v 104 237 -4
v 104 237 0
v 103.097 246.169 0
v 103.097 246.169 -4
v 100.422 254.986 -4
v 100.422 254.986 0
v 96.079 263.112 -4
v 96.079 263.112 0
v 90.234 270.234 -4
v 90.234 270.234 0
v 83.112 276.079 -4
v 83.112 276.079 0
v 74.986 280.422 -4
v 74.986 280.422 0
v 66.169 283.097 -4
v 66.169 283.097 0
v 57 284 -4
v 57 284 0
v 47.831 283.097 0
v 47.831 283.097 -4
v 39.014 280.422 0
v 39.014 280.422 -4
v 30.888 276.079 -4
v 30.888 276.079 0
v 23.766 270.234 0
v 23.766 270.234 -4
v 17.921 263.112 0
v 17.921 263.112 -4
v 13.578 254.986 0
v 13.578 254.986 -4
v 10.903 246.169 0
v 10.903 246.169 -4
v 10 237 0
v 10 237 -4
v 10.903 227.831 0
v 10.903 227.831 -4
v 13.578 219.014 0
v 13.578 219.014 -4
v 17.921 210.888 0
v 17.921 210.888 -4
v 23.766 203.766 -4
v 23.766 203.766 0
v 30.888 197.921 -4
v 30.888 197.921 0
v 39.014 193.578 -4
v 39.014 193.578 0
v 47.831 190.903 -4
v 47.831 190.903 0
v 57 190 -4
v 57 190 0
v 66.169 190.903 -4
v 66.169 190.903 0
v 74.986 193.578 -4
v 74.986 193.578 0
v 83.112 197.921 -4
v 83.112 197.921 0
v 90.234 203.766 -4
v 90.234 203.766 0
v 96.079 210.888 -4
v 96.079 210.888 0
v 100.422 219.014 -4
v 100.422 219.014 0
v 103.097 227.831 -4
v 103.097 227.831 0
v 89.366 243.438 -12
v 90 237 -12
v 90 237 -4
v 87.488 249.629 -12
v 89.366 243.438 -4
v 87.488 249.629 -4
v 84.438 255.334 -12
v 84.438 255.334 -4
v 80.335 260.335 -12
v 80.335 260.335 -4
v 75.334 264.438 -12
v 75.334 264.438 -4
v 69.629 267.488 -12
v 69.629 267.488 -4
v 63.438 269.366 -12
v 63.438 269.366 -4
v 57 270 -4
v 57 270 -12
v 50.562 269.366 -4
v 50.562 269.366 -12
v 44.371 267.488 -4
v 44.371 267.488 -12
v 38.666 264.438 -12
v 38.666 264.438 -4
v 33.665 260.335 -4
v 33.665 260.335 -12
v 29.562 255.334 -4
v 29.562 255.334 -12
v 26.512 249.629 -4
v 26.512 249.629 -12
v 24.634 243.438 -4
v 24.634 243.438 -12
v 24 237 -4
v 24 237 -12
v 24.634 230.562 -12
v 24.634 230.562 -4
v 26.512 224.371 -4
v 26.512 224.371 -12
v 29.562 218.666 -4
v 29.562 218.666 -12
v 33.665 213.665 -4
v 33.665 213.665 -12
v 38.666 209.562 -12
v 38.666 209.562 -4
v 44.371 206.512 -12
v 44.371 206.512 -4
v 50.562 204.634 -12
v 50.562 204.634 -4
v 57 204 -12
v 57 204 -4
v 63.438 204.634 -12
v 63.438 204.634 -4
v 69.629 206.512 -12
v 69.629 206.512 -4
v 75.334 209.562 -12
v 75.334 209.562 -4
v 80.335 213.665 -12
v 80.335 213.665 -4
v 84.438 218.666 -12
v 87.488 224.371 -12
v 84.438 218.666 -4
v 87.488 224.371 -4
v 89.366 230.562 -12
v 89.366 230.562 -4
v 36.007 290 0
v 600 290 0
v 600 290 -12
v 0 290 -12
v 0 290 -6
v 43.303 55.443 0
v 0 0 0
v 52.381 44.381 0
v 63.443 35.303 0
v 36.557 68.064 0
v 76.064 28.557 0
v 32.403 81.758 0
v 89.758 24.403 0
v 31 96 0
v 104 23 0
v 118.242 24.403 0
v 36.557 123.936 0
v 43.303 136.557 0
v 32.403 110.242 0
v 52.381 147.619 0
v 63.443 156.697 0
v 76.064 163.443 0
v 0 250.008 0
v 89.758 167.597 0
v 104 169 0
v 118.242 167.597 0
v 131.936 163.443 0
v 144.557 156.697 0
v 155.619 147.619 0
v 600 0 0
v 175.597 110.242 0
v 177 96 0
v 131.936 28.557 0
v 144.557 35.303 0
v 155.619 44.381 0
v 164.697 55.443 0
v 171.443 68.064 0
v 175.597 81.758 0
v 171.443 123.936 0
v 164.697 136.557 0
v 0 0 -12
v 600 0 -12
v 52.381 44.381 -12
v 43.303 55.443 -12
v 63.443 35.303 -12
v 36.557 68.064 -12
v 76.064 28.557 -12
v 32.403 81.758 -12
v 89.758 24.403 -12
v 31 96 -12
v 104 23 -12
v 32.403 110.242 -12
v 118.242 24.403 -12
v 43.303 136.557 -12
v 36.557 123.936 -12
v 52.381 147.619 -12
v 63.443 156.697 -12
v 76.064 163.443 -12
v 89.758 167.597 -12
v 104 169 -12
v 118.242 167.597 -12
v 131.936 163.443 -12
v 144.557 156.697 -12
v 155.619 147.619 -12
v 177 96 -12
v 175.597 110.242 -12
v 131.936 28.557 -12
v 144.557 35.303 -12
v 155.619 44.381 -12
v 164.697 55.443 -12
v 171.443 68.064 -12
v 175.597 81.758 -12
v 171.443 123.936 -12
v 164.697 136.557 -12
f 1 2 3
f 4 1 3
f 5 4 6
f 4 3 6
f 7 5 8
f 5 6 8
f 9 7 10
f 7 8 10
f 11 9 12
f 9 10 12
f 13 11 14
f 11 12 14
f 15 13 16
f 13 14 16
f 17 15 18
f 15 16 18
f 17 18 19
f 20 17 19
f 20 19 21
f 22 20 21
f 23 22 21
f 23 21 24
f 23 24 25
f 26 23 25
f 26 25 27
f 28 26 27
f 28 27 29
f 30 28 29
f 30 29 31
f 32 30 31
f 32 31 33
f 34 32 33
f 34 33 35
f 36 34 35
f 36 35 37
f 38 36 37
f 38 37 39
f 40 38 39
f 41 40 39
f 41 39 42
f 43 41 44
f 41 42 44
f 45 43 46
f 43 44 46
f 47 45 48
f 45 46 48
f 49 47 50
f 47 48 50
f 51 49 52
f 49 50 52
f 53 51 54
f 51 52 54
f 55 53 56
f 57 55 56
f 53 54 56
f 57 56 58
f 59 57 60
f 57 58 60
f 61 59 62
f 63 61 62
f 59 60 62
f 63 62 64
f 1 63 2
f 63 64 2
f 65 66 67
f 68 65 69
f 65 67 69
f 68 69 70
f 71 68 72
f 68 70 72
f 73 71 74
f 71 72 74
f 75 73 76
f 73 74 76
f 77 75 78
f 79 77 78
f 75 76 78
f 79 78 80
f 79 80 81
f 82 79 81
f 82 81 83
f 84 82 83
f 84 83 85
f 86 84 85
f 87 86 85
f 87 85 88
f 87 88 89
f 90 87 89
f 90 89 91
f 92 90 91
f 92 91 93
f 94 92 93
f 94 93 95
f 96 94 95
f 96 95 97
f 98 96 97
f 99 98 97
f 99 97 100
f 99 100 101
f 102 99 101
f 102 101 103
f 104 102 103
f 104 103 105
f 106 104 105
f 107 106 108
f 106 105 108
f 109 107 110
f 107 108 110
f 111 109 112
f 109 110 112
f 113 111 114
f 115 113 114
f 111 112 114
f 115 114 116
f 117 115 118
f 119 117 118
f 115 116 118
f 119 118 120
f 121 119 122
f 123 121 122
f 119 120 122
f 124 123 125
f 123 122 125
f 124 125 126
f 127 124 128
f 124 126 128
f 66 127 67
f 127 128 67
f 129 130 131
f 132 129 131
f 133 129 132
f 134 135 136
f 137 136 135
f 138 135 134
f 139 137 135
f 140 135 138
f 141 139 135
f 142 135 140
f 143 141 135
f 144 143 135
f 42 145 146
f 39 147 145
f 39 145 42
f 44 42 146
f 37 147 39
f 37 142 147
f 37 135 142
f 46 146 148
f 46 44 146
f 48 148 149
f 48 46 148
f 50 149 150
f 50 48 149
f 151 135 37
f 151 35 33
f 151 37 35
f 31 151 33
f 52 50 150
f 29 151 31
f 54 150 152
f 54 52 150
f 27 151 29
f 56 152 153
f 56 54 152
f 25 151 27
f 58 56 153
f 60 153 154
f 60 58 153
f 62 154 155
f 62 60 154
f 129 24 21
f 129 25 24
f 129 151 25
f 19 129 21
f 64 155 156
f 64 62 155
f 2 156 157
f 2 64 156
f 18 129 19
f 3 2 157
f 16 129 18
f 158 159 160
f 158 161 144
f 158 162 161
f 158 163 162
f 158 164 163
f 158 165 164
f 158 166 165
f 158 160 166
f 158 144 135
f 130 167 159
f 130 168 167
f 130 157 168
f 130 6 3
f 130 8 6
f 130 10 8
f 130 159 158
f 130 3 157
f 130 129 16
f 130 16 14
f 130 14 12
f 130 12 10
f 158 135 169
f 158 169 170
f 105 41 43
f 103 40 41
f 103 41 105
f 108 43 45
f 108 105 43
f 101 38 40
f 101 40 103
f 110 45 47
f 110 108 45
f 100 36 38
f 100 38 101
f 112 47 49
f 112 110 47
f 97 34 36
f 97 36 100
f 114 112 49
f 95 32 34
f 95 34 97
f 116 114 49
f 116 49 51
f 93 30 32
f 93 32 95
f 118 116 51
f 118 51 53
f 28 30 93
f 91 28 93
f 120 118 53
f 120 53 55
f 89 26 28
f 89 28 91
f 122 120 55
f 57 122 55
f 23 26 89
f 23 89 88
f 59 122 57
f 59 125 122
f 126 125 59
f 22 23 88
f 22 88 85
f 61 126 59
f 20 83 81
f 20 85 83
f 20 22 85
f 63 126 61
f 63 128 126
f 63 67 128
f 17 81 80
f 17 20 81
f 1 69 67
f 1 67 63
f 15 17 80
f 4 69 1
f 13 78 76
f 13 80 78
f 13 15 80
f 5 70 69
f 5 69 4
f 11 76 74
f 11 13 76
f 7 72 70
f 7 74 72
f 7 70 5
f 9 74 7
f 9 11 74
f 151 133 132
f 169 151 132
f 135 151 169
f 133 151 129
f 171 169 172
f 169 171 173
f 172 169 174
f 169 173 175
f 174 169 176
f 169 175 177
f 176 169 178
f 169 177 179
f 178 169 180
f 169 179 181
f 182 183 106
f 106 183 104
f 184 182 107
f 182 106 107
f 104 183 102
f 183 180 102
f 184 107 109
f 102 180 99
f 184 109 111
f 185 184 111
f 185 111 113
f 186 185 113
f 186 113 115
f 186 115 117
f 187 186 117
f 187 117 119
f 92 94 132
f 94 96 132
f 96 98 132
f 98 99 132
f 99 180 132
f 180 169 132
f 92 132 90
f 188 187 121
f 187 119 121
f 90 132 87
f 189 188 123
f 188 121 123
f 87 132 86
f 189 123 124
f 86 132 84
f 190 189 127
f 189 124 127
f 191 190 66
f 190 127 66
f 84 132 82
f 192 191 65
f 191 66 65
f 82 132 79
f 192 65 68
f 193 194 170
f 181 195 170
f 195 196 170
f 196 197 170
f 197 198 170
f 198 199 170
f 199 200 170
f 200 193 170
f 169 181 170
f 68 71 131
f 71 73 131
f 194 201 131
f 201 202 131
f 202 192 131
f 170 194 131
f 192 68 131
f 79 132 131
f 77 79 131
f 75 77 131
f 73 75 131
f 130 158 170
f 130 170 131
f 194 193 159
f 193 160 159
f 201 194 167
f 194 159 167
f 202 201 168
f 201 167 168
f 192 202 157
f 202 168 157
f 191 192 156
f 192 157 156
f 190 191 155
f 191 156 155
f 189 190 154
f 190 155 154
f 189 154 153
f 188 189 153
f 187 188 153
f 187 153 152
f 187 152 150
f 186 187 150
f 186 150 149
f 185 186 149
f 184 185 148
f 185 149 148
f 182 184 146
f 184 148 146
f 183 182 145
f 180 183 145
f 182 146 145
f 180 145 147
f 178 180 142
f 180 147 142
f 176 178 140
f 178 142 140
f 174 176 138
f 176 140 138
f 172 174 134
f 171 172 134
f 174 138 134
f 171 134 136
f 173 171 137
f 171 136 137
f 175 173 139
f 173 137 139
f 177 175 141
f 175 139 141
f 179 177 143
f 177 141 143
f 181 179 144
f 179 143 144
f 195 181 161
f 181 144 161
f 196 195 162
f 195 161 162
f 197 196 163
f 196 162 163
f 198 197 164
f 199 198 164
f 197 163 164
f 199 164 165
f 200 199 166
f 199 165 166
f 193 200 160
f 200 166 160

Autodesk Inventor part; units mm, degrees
ref_plane "YZ Plane" through (0, 0, 0) normal (1, 0, 0) x (0, 1, 0)
ref_plane "XZ Plane" through (0, 0, 0) normal (0, 1, 0) x (-1, 0, 0)
sketch "Front0" plane through (0, 0, 0) normal (0, 0, 1) x (1, 0, 0)
  line L0 (0, 0) -> (600, 0)
  line L1 (600, 0) -> (600, 290)
  line L2 (600, 290) -> (0, 290)
  line L3 (0, 290) -> (0, 0)
  circle A0 centre (104, 96) radius 73
  circle A1 centre (104, 96) radius 91
  circle A2 centre (57, 237) radius 47
  circle A3 centre (57, 237) radius 33
  line L4 (36, 290) -> (0, 250)
  line L5 (196, 290) -> (196, 0) construction
  point P0 (47.17, 0)
  point P1 (0, 87)
  dimension "d0" = 600
  dimension "d1" = 290
  dimension "d2" = 146
  dimension "d3" = 182
  dimension "d4" = 94
  dimension "d5" = 66
  dimension "d17" = 96
  dimension "d36" = 104
  dimension "d37" = 57
  dimension "d38" = 53
  dimension "d40" = 92
  dimension "d24" = 146
  dimension "d25" = 182
extrude "Выдавливание2" add sketch "Front0" against normal blind 12 contours L3 L4 L2 L1 L0 | L3 L2 L4 | A1 | A2
ref_plane "РабПлоскость9" through (0, 290, -6) normal (0.1626, -0.1464, -0.9758) x (0.9864, 0, 0.1644)
split "Разделение5" plane through (0, 290, -6) removes the side toward (-0.1626, 0.1464, 0.9758)
extrude "Выдавливание7" cut sketch "Front0" against normal blind 4 contours A2
properties part number "Front_L"
